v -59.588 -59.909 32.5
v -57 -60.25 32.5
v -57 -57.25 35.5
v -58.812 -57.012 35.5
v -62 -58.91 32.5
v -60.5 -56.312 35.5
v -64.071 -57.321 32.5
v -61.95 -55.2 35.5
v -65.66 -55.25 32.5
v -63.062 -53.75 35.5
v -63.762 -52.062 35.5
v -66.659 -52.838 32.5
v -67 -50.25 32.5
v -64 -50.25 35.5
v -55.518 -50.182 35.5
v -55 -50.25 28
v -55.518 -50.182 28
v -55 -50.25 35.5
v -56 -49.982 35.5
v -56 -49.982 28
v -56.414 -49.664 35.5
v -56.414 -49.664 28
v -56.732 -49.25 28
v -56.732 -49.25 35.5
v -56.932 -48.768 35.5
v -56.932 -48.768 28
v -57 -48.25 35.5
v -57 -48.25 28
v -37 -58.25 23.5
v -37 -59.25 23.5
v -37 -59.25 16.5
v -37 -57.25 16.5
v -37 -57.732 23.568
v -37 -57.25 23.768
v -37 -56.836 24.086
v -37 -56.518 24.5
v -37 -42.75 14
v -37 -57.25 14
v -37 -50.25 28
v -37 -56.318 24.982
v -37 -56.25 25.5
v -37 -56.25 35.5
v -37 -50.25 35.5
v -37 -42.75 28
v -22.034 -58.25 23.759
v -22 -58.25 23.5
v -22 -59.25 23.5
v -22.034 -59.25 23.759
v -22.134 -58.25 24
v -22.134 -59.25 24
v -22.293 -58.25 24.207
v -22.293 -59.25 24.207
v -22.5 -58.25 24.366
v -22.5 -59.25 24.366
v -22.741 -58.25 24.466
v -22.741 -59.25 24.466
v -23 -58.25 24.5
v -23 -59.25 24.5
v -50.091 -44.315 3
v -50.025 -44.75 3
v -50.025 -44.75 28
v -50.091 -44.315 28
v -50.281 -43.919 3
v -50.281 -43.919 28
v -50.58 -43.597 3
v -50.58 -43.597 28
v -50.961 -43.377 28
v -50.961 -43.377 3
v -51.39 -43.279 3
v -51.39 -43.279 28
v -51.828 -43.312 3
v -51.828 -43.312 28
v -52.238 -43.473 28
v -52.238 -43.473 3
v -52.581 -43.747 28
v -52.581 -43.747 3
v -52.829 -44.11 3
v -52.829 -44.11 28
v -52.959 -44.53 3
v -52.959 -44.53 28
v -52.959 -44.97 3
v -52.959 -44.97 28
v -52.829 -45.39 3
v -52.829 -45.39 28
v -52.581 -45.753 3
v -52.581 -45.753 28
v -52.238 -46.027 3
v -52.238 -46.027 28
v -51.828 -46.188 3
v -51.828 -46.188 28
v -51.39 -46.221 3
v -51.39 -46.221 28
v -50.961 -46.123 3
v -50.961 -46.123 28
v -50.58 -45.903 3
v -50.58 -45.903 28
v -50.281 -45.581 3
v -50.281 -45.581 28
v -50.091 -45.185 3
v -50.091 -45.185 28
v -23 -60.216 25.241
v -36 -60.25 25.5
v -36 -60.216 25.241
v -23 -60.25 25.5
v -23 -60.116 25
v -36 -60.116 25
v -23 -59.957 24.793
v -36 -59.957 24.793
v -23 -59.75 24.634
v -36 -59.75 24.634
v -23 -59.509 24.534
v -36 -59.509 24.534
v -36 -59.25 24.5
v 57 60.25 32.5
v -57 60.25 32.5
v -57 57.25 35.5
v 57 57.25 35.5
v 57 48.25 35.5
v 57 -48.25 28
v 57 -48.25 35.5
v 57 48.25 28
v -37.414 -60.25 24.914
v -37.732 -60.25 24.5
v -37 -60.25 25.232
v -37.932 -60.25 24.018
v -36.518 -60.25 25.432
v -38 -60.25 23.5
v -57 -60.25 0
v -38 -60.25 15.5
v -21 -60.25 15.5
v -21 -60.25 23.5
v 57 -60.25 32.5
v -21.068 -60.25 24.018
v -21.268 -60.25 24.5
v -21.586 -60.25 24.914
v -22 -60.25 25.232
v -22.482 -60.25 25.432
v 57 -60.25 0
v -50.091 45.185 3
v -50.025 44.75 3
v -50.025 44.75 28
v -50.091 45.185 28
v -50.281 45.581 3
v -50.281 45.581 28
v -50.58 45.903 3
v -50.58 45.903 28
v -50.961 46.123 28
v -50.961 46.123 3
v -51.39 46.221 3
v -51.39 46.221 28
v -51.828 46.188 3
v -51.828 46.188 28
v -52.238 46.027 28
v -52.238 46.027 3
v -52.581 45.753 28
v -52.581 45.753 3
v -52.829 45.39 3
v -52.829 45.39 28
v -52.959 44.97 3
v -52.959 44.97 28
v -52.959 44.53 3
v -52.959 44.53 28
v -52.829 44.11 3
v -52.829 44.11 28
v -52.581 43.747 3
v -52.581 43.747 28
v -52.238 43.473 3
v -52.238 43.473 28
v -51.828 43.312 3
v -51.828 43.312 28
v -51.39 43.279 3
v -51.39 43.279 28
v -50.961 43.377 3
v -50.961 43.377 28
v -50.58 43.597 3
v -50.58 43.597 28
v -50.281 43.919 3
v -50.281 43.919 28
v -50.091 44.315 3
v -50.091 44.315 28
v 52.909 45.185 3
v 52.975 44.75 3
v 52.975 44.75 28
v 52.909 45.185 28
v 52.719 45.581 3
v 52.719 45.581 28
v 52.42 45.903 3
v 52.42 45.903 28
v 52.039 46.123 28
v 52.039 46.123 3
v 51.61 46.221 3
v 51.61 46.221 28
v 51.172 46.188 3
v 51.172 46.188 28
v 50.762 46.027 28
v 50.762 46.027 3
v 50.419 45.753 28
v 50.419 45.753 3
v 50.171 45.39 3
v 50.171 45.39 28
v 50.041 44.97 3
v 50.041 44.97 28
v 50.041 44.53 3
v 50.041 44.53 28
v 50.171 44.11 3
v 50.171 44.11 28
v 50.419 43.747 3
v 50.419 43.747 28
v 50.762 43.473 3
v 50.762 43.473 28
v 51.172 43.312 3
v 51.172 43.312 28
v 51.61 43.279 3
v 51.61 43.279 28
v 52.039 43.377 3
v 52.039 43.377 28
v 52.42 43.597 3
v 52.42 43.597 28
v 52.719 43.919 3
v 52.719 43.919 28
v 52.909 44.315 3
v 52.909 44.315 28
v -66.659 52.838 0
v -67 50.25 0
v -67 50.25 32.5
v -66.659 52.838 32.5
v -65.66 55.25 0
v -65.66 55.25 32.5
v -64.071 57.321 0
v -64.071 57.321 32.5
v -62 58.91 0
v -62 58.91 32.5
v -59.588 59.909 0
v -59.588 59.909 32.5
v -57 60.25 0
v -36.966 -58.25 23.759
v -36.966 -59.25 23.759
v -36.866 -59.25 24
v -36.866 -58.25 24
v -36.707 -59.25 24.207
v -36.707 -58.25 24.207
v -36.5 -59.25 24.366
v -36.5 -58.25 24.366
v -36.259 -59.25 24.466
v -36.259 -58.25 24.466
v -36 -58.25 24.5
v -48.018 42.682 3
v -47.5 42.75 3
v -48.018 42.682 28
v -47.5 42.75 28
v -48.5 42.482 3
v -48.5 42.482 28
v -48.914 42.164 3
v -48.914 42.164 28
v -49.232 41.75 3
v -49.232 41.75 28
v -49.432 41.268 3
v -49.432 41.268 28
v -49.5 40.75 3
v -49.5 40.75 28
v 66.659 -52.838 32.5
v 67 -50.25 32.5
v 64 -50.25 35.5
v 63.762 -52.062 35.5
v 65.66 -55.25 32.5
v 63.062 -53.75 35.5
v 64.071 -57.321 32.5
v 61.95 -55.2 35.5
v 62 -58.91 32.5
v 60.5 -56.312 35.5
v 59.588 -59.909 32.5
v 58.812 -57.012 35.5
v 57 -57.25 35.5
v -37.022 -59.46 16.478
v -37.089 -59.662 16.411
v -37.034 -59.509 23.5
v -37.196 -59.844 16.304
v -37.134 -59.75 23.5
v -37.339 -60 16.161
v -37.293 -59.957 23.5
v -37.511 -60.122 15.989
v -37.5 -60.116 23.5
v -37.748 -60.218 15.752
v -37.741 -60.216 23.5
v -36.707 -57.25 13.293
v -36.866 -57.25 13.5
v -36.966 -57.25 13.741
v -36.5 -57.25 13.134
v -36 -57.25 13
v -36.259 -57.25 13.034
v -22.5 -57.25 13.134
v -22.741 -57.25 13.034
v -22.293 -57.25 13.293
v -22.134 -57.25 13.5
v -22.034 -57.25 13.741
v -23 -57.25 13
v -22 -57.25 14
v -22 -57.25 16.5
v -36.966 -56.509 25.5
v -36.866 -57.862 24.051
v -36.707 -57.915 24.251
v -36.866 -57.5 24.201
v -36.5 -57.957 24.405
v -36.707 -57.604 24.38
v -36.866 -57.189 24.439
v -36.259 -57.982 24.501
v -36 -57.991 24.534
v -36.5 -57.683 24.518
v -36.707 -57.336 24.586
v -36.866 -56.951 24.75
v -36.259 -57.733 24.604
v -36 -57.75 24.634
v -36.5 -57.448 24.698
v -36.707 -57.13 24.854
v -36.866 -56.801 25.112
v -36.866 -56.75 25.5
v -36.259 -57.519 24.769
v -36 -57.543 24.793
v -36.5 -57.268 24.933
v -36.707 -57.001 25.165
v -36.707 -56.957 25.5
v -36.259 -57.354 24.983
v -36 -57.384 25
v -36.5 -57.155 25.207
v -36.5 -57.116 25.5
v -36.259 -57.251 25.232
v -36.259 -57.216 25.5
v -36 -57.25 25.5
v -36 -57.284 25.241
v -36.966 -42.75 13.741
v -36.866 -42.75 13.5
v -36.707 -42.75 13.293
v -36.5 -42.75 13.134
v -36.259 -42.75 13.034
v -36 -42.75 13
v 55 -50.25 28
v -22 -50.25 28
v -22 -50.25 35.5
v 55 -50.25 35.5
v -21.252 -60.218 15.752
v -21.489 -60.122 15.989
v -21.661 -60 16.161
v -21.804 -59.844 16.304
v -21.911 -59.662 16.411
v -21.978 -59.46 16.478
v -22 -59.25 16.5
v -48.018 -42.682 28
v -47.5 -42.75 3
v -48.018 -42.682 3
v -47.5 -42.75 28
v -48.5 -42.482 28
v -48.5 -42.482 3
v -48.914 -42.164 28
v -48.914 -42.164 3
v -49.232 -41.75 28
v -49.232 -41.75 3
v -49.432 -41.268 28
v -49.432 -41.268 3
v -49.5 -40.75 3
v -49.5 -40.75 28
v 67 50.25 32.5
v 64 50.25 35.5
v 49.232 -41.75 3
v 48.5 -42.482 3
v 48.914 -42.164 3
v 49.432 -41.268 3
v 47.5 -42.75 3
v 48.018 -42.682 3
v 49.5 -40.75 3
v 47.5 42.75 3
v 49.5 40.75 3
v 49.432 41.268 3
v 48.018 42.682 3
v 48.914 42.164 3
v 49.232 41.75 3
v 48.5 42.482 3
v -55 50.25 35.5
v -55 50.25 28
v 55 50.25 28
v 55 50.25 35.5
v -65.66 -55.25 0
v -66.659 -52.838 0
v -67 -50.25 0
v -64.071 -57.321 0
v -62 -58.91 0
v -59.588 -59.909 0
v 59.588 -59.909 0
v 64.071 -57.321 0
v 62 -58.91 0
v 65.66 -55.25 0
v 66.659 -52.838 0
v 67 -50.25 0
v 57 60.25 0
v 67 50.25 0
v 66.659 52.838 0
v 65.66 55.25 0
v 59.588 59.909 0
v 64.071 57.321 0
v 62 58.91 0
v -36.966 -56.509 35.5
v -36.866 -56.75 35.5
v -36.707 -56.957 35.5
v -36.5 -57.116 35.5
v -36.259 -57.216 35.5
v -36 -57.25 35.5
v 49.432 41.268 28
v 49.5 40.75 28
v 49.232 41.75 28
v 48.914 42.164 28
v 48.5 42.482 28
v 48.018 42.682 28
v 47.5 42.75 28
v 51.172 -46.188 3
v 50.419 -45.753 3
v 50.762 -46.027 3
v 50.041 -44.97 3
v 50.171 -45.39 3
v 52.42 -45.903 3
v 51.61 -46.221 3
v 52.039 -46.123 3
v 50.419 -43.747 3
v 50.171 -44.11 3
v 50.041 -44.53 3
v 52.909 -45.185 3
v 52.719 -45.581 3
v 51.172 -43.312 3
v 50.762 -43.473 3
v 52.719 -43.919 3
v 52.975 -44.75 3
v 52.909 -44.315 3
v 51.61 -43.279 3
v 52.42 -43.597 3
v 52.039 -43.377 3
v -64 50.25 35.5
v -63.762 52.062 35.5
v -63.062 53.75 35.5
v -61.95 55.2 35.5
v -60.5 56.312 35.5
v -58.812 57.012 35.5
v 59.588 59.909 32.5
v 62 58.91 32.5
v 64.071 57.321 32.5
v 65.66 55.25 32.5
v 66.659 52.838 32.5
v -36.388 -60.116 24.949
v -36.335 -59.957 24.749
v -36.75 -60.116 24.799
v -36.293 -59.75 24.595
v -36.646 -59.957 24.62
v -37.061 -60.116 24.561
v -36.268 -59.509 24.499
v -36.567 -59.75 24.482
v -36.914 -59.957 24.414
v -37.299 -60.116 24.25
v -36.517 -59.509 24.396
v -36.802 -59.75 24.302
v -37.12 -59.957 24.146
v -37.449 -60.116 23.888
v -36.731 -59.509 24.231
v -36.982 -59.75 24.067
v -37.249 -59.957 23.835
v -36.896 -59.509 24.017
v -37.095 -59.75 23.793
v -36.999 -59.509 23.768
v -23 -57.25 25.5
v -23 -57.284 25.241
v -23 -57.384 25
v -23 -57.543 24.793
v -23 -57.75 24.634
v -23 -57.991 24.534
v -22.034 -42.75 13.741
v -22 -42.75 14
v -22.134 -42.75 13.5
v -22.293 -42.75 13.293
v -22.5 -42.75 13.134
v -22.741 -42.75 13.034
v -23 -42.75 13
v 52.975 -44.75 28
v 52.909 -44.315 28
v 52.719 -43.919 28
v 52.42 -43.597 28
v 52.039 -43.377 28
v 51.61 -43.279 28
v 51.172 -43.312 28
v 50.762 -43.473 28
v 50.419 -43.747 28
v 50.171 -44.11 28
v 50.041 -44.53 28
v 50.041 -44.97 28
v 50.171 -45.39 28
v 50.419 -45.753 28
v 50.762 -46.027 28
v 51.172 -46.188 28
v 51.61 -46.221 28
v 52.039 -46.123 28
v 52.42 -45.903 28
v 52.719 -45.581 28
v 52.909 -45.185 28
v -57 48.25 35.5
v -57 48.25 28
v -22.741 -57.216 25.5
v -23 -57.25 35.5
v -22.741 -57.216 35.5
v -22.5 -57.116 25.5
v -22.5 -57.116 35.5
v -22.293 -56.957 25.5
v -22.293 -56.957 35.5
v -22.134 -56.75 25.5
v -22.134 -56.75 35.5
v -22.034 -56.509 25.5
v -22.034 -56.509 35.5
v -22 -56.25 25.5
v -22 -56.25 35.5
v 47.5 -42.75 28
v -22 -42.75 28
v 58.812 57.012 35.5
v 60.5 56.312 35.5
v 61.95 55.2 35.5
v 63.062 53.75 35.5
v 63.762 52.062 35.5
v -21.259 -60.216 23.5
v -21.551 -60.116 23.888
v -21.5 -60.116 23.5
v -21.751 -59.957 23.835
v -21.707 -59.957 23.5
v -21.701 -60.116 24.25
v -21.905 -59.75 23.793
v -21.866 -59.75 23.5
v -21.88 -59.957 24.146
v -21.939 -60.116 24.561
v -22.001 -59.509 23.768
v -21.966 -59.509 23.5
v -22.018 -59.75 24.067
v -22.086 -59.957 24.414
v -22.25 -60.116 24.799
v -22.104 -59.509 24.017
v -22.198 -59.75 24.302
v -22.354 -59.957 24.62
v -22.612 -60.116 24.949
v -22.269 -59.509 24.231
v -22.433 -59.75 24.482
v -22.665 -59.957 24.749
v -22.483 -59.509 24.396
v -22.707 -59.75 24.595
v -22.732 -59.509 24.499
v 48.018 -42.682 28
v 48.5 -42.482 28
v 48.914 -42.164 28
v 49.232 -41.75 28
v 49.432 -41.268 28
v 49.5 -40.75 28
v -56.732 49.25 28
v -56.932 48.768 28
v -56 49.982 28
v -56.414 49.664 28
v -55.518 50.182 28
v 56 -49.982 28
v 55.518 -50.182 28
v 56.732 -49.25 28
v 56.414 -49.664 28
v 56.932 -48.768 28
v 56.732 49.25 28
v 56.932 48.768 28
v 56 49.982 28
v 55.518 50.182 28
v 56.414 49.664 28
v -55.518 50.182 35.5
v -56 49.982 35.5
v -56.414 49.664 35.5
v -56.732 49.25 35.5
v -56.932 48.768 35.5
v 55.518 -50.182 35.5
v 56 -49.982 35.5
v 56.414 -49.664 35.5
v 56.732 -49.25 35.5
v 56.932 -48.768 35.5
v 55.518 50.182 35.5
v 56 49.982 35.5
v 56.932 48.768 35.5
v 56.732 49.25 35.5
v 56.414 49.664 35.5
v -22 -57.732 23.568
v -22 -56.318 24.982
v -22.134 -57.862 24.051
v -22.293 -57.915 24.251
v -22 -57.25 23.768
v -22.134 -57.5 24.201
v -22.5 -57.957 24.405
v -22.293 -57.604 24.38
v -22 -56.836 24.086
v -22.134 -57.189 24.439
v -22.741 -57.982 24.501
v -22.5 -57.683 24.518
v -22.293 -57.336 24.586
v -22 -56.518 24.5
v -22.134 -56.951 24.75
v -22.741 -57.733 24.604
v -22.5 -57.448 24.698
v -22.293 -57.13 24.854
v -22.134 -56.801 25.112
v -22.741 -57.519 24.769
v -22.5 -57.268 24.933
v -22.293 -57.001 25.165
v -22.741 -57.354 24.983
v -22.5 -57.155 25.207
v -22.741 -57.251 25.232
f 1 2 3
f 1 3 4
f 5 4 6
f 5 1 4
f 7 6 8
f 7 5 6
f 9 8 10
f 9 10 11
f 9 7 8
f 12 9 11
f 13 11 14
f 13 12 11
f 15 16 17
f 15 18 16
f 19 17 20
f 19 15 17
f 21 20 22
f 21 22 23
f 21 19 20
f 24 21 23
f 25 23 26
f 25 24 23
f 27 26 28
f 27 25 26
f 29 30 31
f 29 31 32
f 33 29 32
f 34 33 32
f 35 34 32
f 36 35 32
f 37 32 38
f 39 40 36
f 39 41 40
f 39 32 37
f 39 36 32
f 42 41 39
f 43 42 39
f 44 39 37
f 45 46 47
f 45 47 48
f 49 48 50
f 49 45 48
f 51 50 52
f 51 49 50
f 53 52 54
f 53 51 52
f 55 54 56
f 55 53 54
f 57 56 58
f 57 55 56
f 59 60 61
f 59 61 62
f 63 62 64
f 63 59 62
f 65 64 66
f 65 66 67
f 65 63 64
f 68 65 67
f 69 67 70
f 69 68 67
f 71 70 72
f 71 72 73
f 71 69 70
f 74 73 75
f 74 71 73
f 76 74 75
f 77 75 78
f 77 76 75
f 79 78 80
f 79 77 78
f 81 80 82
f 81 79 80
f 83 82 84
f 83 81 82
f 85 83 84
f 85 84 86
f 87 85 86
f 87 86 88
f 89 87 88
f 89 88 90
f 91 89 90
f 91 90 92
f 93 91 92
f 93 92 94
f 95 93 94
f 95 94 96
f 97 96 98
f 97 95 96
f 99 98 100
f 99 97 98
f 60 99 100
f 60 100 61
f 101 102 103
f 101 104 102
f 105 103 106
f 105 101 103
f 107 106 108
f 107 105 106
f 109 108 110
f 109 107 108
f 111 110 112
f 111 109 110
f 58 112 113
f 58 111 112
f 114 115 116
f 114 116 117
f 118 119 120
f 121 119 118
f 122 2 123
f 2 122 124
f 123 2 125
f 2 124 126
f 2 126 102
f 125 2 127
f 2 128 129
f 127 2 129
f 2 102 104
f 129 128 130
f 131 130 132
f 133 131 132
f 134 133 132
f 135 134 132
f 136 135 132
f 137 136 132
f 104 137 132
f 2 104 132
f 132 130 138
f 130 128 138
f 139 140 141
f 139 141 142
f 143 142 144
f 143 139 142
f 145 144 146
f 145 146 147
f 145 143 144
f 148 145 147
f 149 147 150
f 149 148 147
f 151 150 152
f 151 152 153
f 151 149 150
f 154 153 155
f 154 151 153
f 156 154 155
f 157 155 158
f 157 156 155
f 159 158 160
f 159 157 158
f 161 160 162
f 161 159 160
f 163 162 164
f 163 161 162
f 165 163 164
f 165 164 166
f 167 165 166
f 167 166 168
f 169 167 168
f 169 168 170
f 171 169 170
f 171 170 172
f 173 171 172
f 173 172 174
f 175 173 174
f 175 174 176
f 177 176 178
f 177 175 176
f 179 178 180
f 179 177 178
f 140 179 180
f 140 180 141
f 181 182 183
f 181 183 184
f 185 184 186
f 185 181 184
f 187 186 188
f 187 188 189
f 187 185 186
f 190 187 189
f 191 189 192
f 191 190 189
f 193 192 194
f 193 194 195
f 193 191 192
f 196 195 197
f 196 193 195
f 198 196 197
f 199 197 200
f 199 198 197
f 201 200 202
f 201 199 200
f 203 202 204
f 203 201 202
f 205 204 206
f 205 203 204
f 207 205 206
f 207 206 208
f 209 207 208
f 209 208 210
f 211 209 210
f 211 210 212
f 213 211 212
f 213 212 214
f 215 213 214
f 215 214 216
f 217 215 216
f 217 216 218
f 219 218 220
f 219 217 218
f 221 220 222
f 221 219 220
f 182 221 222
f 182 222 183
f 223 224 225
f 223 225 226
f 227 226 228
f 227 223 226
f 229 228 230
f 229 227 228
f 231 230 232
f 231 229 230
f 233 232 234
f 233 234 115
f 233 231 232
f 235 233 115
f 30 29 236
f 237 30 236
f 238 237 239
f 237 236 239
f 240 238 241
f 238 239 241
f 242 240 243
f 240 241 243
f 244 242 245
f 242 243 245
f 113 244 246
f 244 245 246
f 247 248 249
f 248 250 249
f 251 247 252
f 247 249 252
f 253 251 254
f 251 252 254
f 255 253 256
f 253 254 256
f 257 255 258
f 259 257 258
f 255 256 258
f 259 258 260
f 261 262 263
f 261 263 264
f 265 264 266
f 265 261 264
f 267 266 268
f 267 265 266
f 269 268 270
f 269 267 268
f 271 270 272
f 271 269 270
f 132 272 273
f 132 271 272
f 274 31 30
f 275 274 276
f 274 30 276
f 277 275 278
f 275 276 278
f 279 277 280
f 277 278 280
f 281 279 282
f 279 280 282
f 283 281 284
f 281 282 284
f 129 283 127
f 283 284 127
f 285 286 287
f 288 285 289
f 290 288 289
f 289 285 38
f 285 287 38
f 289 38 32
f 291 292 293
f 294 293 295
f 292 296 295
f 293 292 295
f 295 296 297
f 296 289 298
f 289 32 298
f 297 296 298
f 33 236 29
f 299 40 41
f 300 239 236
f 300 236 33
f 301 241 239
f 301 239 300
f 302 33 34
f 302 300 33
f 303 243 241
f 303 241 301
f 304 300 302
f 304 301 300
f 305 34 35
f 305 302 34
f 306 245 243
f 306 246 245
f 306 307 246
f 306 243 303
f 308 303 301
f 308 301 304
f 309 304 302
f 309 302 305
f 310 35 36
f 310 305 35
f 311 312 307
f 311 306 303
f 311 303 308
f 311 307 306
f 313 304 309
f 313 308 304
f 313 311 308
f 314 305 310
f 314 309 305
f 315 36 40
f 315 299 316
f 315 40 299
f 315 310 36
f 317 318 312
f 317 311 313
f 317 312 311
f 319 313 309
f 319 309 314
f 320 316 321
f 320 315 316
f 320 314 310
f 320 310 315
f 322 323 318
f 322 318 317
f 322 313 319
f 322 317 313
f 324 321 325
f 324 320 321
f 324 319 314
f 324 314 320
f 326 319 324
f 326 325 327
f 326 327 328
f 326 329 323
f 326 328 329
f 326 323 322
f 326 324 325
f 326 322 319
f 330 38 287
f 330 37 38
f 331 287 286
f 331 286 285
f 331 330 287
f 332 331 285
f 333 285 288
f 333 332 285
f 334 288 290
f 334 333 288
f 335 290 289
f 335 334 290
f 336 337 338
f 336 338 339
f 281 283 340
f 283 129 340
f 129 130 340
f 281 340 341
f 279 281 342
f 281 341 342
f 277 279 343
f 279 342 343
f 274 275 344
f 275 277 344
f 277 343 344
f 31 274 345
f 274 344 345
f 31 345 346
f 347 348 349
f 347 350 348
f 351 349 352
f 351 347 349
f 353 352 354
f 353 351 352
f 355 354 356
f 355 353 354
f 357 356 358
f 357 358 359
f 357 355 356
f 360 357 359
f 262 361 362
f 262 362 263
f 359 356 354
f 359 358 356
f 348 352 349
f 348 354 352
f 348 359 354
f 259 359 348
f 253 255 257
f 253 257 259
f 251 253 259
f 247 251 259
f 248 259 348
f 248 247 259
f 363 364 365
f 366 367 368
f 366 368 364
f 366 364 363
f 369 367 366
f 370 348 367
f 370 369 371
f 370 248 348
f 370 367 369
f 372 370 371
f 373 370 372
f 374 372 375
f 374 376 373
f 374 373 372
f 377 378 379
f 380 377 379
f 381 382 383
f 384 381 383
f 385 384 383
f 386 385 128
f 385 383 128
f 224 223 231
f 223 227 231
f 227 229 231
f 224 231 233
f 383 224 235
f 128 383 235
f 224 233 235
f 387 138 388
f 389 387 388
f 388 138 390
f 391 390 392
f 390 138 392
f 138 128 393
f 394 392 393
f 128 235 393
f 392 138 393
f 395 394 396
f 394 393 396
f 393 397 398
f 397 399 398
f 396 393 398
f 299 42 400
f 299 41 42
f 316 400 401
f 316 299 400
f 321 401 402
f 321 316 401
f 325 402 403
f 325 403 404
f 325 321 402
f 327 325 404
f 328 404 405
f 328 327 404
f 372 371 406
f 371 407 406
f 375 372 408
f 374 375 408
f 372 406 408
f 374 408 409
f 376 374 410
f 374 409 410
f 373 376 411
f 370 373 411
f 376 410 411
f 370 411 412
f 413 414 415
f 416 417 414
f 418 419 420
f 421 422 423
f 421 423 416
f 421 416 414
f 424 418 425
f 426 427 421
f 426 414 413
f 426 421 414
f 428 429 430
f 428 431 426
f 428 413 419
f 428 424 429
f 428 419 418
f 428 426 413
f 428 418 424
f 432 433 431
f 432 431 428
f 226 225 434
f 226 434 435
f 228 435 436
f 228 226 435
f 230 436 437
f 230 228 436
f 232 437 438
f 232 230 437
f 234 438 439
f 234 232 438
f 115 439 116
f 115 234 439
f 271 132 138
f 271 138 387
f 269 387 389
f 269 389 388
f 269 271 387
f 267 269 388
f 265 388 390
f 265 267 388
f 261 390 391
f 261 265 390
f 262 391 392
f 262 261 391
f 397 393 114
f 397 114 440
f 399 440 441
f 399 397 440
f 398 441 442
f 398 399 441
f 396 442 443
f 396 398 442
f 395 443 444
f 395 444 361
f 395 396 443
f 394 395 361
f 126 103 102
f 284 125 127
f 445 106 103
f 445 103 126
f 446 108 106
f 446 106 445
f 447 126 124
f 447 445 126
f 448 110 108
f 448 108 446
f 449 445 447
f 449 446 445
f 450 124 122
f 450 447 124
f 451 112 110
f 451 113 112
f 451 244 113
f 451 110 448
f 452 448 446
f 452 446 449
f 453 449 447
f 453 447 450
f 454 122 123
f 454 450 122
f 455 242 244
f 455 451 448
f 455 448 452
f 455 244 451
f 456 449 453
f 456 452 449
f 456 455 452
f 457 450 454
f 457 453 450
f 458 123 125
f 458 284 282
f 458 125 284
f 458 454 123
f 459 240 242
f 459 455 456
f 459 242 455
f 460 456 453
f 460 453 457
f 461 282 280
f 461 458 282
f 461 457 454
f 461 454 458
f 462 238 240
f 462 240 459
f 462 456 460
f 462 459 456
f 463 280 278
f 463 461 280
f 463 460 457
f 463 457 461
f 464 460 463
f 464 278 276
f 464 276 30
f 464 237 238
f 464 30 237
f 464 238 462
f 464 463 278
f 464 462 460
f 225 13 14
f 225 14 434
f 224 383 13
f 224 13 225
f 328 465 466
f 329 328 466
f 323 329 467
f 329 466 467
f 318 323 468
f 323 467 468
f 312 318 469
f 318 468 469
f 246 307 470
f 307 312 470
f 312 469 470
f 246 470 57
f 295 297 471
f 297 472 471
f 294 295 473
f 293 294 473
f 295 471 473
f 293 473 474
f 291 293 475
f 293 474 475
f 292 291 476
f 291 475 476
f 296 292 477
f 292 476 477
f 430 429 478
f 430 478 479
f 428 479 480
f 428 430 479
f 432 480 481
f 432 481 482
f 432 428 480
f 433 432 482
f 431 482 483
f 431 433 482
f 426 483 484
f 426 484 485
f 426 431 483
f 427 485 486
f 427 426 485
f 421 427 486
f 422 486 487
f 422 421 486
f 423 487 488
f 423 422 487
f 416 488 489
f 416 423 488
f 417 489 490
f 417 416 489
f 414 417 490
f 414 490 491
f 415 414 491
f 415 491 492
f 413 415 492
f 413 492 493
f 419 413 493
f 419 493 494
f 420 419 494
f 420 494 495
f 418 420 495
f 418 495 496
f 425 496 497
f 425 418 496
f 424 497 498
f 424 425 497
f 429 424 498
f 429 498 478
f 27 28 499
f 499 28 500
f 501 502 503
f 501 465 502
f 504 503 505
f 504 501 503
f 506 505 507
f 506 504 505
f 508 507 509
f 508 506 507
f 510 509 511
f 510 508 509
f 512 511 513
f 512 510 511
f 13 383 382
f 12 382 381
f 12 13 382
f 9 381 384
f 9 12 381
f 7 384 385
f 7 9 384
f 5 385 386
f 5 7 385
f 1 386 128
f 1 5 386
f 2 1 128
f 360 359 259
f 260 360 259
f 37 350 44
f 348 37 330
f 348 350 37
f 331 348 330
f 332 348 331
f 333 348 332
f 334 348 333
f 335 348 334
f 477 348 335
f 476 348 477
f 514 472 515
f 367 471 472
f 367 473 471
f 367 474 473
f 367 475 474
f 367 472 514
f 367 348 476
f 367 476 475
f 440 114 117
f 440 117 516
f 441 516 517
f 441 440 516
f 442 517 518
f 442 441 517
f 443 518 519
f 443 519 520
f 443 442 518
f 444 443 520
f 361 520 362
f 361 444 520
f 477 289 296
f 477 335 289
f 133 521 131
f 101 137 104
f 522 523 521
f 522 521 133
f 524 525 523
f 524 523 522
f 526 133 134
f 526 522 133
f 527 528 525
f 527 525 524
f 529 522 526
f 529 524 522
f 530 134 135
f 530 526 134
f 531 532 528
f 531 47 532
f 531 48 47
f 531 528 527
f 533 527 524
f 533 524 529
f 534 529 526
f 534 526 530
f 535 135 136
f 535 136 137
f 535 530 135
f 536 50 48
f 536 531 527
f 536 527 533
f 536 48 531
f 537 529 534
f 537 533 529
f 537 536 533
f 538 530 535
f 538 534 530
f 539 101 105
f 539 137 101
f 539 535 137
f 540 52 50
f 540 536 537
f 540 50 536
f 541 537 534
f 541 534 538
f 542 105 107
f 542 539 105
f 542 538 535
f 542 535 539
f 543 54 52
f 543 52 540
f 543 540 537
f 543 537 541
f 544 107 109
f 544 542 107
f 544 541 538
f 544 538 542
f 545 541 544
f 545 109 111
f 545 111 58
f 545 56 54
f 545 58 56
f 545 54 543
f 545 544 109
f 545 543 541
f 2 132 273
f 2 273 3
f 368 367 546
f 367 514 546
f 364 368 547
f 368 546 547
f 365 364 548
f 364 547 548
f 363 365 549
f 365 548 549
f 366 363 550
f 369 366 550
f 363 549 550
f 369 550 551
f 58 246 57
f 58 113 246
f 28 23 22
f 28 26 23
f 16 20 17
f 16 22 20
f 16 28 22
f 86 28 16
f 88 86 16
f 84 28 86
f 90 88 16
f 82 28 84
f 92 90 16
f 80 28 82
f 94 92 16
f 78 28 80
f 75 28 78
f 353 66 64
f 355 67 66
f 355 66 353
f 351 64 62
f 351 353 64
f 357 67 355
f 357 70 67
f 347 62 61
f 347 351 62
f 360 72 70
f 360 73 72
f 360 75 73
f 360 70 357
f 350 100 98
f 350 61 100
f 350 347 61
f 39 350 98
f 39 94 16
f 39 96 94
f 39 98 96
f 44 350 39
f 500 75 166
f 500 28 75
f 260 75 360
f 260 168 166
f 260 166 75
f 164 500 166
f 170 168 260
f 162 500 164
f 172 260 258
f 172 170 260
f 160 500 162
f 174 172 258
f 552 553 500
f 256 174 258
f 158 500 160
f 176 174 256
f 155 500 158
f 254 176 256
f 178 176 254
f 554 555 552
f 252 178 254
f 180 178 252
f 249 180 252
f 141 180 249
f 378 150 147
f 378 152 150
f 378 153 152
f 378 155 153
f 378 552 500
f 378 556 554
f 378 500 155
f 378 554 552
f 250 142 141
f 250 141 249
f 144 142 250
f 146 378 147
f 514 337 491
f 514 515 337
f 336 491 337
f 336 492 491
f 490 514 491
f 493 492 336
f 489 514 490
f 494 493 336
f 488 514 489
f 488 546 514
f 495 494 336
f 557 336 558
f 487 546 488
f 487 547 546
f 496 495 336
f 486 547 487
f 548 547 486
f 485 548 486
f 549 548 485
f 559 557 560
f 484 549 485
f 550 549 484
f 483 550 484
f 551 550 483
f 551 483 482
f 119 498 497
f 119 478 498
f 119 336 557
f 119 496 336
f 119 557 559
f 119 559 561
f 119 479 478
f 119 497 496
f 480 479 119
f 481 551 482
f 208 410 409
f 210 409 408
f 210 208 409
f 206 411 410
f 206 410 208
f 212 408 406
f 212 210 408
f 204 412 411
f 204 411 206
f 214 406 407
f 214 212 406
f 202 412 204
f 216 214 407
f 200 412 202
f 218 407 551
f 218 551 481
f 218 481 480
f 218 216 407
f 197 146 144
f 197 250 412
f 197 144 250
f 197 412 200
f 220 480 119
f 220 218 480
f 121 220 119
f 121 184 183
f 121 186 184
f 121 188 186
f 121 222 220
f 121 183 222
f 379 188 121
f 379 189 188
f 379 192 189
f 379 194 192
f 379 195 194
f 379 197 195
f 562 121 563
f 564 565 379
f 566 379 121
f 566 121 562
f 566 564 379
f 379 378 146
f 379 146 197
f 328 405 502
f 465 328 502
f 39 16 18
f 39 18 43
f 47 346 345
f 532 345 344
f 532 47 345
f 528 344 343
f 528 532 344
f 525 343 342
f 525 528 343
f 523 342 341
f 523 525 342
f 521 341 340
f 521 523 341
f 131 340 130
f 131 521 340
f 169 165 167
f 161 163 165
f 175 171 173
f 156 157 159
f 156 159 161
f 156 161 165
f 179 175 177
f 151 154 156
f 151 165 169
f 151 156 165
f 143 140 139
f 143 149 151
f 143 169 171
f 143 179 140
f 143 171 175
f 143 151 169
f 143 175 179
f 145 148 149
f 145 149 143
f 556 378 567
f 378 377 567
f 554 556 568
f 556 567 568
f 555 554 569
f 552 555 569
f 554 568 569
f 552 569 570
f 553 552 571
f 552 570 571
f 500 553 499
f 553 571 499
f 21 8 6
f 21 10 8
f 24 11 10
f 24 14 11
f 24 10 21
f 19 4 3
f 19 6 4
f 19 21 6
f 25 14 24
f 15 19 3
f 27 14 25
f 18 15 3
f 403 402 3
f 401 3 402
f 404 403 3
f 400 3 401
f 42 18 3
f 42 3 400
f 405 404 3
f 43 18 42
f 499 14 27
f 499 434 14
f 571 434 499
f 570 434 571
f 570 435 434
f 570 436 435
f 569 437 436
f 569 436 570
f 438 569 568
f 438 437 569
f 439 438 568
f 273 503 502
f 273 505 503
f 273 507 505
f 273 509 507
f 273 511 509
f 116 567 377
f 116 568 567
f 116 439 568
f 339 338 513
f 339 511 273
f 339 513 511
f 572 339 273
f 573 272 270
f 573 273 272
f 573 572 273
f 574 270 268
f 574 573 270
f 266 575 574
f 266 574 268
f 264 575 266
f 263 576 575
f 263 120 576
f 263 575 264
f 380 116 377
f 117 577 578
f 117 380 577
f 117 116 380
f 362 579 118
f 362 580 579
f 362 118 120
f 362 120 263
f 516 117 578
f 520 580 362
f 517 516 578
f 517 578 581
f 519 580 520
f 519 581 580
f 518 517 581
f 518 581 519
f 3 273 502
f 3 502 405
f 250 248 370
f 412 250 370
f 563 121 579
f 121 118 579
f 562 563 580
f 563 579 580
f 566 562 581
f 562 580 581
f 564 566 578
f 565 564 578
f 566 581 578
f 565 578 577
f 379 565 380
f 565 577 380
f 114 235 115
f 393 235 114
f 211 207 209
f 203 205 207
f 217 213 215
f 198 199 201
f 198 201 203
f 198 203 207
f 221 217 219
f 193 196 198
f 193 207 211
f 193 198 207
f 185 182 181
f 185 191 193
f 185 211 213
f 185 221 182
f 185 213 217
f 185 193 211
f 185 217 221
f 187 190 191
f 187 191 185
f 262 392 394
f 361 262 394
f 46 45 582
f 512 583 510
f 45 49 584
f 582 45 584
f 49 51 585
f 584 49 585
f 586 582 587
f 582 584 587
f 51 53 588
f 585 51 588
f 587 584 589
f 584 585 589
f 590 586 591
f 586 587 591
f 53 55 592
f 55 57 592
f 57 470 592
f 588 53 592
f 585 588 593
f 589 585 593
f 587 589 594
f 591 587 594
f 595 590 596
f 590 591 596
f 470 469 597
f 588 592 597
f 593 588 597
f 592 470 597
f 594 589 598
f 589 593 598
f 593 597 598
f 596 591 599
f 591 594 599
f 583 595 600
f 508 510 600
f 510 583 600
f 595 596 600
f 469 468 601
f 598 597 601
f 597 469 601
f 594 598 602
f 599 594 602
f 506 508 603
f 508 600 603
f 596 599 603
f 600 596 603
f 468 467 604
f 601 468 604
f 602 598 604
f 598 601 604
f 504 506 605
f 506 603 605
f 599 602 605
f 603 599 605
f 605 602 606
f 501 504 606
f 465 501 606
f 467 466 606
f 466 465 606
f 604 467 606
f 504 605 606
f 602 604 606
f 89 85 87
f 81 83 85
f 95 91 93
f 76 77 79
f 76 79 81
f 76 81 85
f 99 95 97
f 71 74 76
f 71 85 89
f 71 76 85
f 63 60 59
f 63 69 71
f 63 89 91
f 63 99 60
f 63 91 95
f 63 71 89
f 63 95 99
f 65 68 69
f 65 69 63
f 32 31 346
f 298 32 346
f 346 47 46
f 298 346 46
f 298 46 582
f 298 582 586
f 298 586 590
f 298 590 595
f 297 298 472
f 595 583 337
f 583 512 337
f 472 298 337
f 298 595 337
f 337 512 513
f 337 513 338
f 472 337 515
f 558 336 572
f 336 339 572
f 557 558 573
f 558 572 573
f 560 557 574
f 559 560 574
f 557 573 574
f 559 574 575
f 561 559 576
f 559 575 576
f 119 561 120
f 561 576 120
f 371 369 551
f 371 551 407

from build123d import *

# Parameters (mm, degrees)
BASE_W              = 134
BASE_H              = 120.5
BASE_W_2            = 114
BASE_H_2            = 100.5
BASE_R              = 1.475
BASE_W_3            = 99
BASE_H_3            = 85.5
BOSS_EXTRUDE1_DEPTH = 3
BOSS_EXTRUDE2_START = 3
BASE_3_W            = 114
BASE_3_H            = 100.5
BASE_3_R            = 1.475
BASE_3_W_2          = 99
BASE_3_H_2          = 85.5
BOSS_EXTRUDE2_DEPTH = 25
BOSS_EXTRUDE3_START = 3
BASE_4_W            = 134
BASE_4_H            = 120.5
BASE_4_W_2          = 114
BASE_4_H_2          = 100.5
BOSS_EXTRUDE3_DEPTH = 32.5
SKETCH2_W           = 15
SKETCH2_H           = 14.5
CUT_EXTRUDE1_DEPTH  = 22.5
SKETCH3_W           = 15
SKETCH3_H           = 8
CUT_EXTRUDE2_DEPTH  = 3
FILLET1_R           = 10
FILLET2_R           = 2
FILLET3_R           = 1
CHAMFER1_SIZE       = 3


with BuildPart() as part:
    # Base → Boss-Extrude1 (new body)
    # profile 1 of 7: a face of its own
    with BuildSketch(Plane.XY):
        Rectangle(BASE_W, BASE_H)
        Rectangle(BASE_W_2, BASE_H_2, mode=Mode.SUBTRACT)
    # profile 2 of 7: a face of its own
    with BuildSketch(Plane.XY):
        Rectangle(BASE_W_2, BASE_H_2)
        with Locations((-51.5, -44.75)):
            Circle(BASE_R, mode=Mode.SUBTRACT)
        with Locations((51.5, -44.75)):
            Circle(BASE_R, mode=Mode.SUBTRACT)
        with Locations((51.5, 44.75)):
            Circle(BASE_R, mode=Mode.SUBTRACT)
        with Locations((-51.5, 44.75)):
            Circle(BASE_R, mode=Mode.SUBTRACT)
        Rectangle(BASE_W_3, BASE_H_3, mode=Mode.SUBTRACT)
    # profile 3 of 7: a face of its own
    with BuildSketch(Plane.XY):
        with Locations((51.5, -44.75)):
            Circle(BASE_R)
    # profile 4 of 7: a face of its own
    with BuildSketch(Plane.XY):
        with Locations((-51.5, 44.75)):
            Circle(BASE_R)
    # profile 5 of 7: a face of its own
    with BuildSketch(Plane.XY):
        with Locations((-51.5, -44.75)):
            Circle(BASE_R)
    # profile 6 of 7: a face of its own
    with BuildSketch(Plane.XY):
        with Locations((51.5, 44.75)):
            Circle(BASE_R)
    # profile 7 of 7: a face of its own
    with BuildSketch(Plane.XY):
        Rectangle(BASE_W_3, BASE_H_3)
    extrude(amount=BOSS_EXTRUDE1_DEPTH)

    # Base<3> → Boss-Extrude2 (add)
    with BuildSketch(Plane.XY.offset(BOSS_EXTRUDE2_START)):
        Rectangle(BASE_3_W, BASE_3_H)
        with Locations((-51.5, -44.75)):
            Circle(BASE_3_R, mode=Mode.SUBTRACT)
        with Locations((51.5, -44.75)):
            Circle(BASE_3_R, mode=Mode.SUBTRACT)
        with Locations((51.5, 44.75)):
            Circle(BASE_3_R, mode=Mode.SUBTRACT)
        with Locations((-51.5, 44.75)):
            Circle(BASE_3_R, mode=Mode.SUBTRACT)
        Rectangle(BASE_3_W_2, BASE_3_H_2, mode=Mode.SUBTRACT)
    extrude(amount=BOSS_EXTRUDE2_DEPTH)

    # Base<4> → Boss-Extrude3 (add)
    with BuildSketch(Plane.XY.offset(BOSS_EXTRUDE3_START)):
        Rectangle(BASE_4_W, BASE_4_H)
        Rectangle(BASE_4_W_2, BASE_4_H_2, mode=Mode.SUBTRACT)
    extrude(amount=BOSS_EXTRUDE3_DEPTH)

    # Sketch2 → Cut-Extrude1 (cut)
    with BuildSketch(Plane.XY.offset(35.5)):
        with Locations((-29.5, -50)):
            Rectangle(SKETCH2_W, SKETCH2_H)
    extrude(amount=-CUT_EXTRUDE1_DEPTH, mode=Mode.SUBTRACT)

    # Sketch3 → Cut-Extrude2 (cut)
    with BuildSketch(Plane.XZ.offset(60.25)):
        with Locations((-29.5, 20.5)):
            Rectangle(SKETCH3_W, SKETCH3_H)
    extrude(amount=-CUT_EXTRUDE2_DEPTH, mode=Mode.SUBTRACT)

    # Fillet1
    fillet1_edges = [part.edges().sort_by_distance(p)[0] for p in [
        (67, 60.25, 17.75),
        (67, -60.25, 17.75),
        (-67, -60.25, 17.75),
        (-67, 60.25, 17.75),
    ]]
    fillet(fillet1_edges, radius=FILLET1_R)

    # Fillet2
    fillet2_edges = [part.edges().sort_by_distance(p)[0] for p in [
        (49.5, -42.75, 15.5),
        (49.5, 42.75, 15.5),
        (-49.5, 42.75, 15.5),
        (-49.5, -42.75, 15.5),
        (57, 50.25, 31.75),
        (-57, -50.25, 31.75),
        (57, -50.25, 31.75),
        (-57, 50.25, 31.75),
    ]]
    fillet(fillet2_edges, radius=FILLET2_R)

    # Fillet3
    fillet3_edges = [part.edges().sort_by_distance(p)[0] for p in [
        (-22, -57.25, 30),
        (-37, -57.25, 30),
        (-37, -60.25, 20.5),
        (-22, -60.25, 20.5),
        (-29.5, -57.25, 24.5),
        (-37, -58.75, 24.5),
        (-29.5, -60.25, 24.5),
        (-22, -58.75, 24.5),
        (-37, -50, 13),
        (-22, -50, 13),
        (-29.5, -60.25, 16.5),
    ]]
    fillet(fillet3_edges, radius=FILLET3_R)

    # Chamfer1
    chamfer1_edges = [part.edges().sort_by_distance(p)[0] for p in [
        (0, 60.25, 35.5),
        (67, 0, 35.5),
        (0, -60.25, 35.5),
        (-67, 0, 35.5),
        (64.071067812, -57.321067812, 35.5),
        (-64.071067812, -57.321067812, 35.5),
        (-64.071067812, 57.321067812, 35.5),
        (64.071067812, 57.321067812, 35.5),
    ]]
    chamfer(chamfer1_edges, length=CHAMFER1_SIZE - 0.0001)  # a hair under: the kernel refuses the full size


solid = part.part
